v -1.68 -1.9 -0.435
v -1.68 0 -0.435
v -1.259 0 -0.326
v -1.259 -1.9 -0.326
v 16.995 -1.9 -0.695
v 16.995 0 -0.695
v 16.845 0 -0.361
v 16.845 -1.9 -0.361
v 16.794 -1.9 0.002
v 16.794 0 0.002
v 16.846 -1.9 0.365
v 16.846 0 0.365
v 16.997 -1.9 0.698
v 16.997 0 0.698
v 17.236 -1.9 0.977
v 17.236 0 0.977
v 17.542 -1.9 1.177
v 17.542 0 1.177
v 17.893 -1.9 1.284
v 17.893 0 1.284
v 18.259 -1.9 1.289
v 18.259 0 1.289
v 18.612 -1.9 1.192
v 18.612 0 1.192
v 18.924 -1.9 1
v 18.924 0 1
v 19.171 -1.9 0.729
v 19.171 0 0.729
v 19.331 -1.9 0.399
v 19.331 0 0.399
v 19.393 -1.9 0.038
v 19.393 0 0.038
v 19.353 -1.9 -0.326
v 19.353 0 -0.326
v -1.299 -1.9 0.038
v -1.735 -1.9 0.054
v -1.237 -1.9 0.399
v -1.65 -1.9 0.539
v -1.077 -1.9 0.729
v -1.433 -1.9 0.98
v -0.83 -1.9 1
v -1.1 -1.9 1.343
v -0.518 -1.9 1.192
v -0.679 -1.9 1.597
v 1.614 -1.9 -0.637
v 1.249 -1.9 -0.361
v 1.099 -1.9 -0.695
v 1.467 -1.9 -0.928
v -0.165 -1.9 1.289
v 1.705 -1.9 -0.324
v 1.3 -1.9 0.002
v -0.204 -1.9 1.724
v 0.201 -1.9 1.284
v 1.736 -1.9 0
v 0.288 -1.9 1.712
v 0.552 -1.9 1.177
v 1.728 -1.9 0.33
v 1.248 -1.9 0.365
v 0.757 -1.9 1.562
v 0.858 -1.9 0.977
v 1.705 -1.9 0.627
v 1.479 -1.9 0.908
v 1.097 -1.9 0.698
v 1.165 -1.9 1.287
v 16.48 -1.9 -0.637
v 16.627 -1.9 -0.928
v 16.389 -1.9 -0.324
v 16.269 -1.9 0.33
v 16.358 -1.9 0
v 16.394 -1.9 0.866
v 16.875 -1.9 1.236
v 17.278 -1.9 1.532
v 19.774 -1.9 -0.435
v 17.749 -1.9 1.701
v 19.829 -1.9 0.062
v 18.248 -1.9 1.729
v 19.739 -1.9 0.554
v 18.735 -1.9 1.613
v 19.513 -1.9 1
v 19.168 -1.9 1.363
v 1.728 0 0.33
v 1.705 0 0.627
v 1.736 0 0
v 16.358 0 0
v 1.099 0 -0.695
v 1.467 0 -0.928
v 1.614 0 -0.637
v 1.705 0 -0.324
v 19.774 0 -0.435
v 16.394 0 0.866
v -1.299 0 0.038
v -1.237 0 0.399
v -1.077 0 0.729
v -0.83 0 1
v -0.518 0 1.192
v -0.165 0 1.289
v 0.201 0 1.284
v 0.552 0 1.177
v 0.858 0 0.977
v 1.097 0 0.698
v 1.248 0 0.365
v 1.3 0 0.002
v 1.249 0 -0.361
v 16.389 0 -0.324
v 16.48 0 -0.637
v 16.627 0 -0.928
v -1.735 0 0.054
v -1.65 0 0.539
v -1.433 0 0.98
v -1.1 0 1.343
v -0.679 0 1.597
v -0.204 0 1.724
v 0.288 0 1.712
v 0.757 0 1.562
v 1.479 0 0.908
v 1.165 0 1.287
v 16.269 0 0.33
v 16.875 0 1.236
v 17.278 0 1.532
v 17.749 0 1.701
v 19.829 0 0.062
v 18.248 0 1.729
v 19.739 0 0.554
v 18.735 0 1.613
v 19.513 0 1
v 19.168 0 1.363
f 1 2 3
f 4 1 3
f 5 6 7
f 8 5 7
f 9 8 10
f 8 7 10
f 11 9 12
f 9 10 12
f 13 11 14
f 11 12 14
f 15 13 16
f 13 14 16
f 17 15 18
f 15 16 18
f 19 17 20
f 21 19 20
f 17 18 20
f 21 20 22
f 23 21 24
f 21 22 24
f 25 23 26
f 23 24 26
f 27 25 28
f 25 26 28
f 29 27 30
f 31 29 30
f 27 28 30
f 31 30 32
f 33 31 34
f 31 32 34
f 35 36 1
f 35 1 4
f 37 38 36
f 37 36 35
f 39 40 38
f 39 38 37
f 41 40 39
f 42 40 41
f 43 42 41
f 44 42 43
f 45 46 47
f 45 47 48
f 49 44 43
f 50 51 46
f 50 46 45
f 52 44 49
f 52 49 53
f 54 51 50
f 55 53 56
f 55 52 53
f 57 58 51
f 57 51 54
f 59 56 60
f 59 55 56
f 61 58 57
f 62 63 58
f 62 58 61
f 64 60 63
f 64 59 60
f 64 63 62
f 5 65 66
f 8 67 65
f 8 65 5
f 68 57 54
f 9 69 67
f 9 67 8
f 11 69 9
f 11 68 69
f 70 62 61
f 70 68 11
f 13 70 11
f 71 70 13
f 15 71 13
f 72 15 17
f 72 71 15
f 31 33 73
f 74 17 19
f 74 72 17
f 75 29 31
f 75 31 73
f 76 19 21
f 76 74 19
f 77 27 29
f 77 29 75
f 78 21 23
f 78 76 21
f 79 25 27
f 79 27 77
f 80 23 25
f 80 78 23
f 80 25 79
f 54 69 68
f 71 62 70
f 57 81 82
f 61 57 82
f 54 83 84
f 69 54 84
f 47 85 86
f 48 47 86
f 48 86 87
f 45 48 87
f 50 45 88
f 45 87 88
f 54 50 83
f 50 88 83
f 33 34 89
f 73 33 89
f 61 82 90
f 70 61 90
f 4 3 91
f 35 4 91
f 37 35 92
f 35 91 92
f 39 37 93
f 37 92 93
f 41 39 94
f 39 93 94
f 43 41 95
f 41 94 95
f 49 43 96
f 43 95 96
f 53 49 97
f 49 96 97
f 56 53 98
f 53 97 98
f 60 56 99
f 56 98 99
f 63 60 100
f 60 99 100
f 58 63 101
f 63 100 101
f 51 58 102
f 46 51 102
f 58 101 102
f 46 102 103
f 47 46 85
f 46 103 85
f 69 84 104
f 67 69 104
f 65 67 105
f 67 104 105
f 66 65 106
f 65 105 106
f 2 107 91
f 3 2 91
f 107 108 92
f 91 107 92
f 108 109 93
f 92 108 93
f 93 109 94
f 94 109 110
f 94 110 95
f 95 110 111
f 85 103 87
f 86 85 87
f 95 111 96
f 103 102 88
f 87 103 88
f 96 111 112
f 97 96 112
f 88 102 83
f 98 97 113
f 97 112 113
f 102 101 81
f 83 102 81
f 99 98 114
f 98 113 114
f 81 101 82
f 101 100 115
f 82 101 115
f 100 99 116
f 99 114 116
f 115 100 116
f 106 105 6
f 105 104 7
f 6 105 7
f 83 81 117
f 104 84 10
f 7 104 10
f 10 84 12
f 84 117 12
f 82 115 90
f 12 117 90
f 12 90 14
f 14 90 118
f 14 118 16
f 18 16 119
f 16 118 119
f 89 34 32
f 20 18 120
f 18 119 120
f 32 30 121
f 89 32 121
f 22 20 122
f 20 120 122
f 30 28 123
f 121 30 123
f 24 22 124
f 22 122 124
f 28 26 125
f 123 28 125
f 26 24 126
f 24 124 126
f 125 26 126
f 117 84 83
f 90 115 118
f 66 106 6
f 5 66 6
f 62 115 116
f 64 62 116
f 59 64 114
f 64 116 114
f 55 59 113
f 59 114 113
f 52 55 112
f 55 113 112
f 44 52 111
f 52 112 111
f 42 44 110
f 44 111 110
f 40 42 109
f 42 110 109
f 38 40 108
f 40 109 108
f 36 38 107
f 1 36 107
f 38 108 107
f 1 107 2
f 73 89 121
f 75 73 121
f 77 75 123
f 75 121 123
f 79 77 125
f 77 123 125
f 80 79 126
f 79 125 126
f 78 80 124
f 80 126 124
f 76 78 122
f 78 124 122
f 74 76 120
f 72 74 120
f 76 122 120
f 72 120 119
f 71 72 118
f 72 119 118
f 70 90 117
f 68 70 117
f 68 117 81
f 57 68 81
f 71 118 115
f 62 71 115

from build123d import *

# Parameters (mm, degrees)
F1_DEPTH = 1.9


with BuildPart() as f1:
    # F0 (on Front) → F1 (new body)
    with BuildSketch(Plane.XZ):
        with BuildLine():
            ThreePointArc((-1.258524, -0.325757), (0.201208, 1.284335), (1.098604, -0.695032))
            Line((1.098604, -0.695032), (1.466869, -0.928015))
            ThreePointArc((1.466869, -0.928015), (1.667194, -0.483095), (1.735775, 0))
            Line((1.735775, 0), (16.358244, 0))
            ThreePointArc((16.358244, 0), (16.426825, -0.483095), (16.62715, -0.928015))
            Line((16.62715, -0.928015), (16.995415, -0.695032))
            ThreePointArc((16.995415, -0.695032), (17.892811, 1.284335), (19.352543, -0.325757))
            Line((19.352543, -0.325757), (19.774415, -0.434954))
            ThreePointArc((19.774415, -0.434954), (18.960684, 1.503931), (16.875129, 1.235808))
            Line((16.875129, 1.235808), (1.479197, 0.908235))
            ThreePointArc((1.479197, 0.908235), (-0.679087, 1.597422), (-1.680396, -0.434954))
            Line((-1.680396, -0.434954), (-1.258524, -0.325757))
        make_face()
        Polygon((1.727705, 0.330091), (1.704895, 0.626613), (16.394122, 0.866111), (16.268671, 0.330091), align=None, mode=Mode.SUBTRACT)
    extrude(amount=F1_DEPTH)


solid = f1.part
